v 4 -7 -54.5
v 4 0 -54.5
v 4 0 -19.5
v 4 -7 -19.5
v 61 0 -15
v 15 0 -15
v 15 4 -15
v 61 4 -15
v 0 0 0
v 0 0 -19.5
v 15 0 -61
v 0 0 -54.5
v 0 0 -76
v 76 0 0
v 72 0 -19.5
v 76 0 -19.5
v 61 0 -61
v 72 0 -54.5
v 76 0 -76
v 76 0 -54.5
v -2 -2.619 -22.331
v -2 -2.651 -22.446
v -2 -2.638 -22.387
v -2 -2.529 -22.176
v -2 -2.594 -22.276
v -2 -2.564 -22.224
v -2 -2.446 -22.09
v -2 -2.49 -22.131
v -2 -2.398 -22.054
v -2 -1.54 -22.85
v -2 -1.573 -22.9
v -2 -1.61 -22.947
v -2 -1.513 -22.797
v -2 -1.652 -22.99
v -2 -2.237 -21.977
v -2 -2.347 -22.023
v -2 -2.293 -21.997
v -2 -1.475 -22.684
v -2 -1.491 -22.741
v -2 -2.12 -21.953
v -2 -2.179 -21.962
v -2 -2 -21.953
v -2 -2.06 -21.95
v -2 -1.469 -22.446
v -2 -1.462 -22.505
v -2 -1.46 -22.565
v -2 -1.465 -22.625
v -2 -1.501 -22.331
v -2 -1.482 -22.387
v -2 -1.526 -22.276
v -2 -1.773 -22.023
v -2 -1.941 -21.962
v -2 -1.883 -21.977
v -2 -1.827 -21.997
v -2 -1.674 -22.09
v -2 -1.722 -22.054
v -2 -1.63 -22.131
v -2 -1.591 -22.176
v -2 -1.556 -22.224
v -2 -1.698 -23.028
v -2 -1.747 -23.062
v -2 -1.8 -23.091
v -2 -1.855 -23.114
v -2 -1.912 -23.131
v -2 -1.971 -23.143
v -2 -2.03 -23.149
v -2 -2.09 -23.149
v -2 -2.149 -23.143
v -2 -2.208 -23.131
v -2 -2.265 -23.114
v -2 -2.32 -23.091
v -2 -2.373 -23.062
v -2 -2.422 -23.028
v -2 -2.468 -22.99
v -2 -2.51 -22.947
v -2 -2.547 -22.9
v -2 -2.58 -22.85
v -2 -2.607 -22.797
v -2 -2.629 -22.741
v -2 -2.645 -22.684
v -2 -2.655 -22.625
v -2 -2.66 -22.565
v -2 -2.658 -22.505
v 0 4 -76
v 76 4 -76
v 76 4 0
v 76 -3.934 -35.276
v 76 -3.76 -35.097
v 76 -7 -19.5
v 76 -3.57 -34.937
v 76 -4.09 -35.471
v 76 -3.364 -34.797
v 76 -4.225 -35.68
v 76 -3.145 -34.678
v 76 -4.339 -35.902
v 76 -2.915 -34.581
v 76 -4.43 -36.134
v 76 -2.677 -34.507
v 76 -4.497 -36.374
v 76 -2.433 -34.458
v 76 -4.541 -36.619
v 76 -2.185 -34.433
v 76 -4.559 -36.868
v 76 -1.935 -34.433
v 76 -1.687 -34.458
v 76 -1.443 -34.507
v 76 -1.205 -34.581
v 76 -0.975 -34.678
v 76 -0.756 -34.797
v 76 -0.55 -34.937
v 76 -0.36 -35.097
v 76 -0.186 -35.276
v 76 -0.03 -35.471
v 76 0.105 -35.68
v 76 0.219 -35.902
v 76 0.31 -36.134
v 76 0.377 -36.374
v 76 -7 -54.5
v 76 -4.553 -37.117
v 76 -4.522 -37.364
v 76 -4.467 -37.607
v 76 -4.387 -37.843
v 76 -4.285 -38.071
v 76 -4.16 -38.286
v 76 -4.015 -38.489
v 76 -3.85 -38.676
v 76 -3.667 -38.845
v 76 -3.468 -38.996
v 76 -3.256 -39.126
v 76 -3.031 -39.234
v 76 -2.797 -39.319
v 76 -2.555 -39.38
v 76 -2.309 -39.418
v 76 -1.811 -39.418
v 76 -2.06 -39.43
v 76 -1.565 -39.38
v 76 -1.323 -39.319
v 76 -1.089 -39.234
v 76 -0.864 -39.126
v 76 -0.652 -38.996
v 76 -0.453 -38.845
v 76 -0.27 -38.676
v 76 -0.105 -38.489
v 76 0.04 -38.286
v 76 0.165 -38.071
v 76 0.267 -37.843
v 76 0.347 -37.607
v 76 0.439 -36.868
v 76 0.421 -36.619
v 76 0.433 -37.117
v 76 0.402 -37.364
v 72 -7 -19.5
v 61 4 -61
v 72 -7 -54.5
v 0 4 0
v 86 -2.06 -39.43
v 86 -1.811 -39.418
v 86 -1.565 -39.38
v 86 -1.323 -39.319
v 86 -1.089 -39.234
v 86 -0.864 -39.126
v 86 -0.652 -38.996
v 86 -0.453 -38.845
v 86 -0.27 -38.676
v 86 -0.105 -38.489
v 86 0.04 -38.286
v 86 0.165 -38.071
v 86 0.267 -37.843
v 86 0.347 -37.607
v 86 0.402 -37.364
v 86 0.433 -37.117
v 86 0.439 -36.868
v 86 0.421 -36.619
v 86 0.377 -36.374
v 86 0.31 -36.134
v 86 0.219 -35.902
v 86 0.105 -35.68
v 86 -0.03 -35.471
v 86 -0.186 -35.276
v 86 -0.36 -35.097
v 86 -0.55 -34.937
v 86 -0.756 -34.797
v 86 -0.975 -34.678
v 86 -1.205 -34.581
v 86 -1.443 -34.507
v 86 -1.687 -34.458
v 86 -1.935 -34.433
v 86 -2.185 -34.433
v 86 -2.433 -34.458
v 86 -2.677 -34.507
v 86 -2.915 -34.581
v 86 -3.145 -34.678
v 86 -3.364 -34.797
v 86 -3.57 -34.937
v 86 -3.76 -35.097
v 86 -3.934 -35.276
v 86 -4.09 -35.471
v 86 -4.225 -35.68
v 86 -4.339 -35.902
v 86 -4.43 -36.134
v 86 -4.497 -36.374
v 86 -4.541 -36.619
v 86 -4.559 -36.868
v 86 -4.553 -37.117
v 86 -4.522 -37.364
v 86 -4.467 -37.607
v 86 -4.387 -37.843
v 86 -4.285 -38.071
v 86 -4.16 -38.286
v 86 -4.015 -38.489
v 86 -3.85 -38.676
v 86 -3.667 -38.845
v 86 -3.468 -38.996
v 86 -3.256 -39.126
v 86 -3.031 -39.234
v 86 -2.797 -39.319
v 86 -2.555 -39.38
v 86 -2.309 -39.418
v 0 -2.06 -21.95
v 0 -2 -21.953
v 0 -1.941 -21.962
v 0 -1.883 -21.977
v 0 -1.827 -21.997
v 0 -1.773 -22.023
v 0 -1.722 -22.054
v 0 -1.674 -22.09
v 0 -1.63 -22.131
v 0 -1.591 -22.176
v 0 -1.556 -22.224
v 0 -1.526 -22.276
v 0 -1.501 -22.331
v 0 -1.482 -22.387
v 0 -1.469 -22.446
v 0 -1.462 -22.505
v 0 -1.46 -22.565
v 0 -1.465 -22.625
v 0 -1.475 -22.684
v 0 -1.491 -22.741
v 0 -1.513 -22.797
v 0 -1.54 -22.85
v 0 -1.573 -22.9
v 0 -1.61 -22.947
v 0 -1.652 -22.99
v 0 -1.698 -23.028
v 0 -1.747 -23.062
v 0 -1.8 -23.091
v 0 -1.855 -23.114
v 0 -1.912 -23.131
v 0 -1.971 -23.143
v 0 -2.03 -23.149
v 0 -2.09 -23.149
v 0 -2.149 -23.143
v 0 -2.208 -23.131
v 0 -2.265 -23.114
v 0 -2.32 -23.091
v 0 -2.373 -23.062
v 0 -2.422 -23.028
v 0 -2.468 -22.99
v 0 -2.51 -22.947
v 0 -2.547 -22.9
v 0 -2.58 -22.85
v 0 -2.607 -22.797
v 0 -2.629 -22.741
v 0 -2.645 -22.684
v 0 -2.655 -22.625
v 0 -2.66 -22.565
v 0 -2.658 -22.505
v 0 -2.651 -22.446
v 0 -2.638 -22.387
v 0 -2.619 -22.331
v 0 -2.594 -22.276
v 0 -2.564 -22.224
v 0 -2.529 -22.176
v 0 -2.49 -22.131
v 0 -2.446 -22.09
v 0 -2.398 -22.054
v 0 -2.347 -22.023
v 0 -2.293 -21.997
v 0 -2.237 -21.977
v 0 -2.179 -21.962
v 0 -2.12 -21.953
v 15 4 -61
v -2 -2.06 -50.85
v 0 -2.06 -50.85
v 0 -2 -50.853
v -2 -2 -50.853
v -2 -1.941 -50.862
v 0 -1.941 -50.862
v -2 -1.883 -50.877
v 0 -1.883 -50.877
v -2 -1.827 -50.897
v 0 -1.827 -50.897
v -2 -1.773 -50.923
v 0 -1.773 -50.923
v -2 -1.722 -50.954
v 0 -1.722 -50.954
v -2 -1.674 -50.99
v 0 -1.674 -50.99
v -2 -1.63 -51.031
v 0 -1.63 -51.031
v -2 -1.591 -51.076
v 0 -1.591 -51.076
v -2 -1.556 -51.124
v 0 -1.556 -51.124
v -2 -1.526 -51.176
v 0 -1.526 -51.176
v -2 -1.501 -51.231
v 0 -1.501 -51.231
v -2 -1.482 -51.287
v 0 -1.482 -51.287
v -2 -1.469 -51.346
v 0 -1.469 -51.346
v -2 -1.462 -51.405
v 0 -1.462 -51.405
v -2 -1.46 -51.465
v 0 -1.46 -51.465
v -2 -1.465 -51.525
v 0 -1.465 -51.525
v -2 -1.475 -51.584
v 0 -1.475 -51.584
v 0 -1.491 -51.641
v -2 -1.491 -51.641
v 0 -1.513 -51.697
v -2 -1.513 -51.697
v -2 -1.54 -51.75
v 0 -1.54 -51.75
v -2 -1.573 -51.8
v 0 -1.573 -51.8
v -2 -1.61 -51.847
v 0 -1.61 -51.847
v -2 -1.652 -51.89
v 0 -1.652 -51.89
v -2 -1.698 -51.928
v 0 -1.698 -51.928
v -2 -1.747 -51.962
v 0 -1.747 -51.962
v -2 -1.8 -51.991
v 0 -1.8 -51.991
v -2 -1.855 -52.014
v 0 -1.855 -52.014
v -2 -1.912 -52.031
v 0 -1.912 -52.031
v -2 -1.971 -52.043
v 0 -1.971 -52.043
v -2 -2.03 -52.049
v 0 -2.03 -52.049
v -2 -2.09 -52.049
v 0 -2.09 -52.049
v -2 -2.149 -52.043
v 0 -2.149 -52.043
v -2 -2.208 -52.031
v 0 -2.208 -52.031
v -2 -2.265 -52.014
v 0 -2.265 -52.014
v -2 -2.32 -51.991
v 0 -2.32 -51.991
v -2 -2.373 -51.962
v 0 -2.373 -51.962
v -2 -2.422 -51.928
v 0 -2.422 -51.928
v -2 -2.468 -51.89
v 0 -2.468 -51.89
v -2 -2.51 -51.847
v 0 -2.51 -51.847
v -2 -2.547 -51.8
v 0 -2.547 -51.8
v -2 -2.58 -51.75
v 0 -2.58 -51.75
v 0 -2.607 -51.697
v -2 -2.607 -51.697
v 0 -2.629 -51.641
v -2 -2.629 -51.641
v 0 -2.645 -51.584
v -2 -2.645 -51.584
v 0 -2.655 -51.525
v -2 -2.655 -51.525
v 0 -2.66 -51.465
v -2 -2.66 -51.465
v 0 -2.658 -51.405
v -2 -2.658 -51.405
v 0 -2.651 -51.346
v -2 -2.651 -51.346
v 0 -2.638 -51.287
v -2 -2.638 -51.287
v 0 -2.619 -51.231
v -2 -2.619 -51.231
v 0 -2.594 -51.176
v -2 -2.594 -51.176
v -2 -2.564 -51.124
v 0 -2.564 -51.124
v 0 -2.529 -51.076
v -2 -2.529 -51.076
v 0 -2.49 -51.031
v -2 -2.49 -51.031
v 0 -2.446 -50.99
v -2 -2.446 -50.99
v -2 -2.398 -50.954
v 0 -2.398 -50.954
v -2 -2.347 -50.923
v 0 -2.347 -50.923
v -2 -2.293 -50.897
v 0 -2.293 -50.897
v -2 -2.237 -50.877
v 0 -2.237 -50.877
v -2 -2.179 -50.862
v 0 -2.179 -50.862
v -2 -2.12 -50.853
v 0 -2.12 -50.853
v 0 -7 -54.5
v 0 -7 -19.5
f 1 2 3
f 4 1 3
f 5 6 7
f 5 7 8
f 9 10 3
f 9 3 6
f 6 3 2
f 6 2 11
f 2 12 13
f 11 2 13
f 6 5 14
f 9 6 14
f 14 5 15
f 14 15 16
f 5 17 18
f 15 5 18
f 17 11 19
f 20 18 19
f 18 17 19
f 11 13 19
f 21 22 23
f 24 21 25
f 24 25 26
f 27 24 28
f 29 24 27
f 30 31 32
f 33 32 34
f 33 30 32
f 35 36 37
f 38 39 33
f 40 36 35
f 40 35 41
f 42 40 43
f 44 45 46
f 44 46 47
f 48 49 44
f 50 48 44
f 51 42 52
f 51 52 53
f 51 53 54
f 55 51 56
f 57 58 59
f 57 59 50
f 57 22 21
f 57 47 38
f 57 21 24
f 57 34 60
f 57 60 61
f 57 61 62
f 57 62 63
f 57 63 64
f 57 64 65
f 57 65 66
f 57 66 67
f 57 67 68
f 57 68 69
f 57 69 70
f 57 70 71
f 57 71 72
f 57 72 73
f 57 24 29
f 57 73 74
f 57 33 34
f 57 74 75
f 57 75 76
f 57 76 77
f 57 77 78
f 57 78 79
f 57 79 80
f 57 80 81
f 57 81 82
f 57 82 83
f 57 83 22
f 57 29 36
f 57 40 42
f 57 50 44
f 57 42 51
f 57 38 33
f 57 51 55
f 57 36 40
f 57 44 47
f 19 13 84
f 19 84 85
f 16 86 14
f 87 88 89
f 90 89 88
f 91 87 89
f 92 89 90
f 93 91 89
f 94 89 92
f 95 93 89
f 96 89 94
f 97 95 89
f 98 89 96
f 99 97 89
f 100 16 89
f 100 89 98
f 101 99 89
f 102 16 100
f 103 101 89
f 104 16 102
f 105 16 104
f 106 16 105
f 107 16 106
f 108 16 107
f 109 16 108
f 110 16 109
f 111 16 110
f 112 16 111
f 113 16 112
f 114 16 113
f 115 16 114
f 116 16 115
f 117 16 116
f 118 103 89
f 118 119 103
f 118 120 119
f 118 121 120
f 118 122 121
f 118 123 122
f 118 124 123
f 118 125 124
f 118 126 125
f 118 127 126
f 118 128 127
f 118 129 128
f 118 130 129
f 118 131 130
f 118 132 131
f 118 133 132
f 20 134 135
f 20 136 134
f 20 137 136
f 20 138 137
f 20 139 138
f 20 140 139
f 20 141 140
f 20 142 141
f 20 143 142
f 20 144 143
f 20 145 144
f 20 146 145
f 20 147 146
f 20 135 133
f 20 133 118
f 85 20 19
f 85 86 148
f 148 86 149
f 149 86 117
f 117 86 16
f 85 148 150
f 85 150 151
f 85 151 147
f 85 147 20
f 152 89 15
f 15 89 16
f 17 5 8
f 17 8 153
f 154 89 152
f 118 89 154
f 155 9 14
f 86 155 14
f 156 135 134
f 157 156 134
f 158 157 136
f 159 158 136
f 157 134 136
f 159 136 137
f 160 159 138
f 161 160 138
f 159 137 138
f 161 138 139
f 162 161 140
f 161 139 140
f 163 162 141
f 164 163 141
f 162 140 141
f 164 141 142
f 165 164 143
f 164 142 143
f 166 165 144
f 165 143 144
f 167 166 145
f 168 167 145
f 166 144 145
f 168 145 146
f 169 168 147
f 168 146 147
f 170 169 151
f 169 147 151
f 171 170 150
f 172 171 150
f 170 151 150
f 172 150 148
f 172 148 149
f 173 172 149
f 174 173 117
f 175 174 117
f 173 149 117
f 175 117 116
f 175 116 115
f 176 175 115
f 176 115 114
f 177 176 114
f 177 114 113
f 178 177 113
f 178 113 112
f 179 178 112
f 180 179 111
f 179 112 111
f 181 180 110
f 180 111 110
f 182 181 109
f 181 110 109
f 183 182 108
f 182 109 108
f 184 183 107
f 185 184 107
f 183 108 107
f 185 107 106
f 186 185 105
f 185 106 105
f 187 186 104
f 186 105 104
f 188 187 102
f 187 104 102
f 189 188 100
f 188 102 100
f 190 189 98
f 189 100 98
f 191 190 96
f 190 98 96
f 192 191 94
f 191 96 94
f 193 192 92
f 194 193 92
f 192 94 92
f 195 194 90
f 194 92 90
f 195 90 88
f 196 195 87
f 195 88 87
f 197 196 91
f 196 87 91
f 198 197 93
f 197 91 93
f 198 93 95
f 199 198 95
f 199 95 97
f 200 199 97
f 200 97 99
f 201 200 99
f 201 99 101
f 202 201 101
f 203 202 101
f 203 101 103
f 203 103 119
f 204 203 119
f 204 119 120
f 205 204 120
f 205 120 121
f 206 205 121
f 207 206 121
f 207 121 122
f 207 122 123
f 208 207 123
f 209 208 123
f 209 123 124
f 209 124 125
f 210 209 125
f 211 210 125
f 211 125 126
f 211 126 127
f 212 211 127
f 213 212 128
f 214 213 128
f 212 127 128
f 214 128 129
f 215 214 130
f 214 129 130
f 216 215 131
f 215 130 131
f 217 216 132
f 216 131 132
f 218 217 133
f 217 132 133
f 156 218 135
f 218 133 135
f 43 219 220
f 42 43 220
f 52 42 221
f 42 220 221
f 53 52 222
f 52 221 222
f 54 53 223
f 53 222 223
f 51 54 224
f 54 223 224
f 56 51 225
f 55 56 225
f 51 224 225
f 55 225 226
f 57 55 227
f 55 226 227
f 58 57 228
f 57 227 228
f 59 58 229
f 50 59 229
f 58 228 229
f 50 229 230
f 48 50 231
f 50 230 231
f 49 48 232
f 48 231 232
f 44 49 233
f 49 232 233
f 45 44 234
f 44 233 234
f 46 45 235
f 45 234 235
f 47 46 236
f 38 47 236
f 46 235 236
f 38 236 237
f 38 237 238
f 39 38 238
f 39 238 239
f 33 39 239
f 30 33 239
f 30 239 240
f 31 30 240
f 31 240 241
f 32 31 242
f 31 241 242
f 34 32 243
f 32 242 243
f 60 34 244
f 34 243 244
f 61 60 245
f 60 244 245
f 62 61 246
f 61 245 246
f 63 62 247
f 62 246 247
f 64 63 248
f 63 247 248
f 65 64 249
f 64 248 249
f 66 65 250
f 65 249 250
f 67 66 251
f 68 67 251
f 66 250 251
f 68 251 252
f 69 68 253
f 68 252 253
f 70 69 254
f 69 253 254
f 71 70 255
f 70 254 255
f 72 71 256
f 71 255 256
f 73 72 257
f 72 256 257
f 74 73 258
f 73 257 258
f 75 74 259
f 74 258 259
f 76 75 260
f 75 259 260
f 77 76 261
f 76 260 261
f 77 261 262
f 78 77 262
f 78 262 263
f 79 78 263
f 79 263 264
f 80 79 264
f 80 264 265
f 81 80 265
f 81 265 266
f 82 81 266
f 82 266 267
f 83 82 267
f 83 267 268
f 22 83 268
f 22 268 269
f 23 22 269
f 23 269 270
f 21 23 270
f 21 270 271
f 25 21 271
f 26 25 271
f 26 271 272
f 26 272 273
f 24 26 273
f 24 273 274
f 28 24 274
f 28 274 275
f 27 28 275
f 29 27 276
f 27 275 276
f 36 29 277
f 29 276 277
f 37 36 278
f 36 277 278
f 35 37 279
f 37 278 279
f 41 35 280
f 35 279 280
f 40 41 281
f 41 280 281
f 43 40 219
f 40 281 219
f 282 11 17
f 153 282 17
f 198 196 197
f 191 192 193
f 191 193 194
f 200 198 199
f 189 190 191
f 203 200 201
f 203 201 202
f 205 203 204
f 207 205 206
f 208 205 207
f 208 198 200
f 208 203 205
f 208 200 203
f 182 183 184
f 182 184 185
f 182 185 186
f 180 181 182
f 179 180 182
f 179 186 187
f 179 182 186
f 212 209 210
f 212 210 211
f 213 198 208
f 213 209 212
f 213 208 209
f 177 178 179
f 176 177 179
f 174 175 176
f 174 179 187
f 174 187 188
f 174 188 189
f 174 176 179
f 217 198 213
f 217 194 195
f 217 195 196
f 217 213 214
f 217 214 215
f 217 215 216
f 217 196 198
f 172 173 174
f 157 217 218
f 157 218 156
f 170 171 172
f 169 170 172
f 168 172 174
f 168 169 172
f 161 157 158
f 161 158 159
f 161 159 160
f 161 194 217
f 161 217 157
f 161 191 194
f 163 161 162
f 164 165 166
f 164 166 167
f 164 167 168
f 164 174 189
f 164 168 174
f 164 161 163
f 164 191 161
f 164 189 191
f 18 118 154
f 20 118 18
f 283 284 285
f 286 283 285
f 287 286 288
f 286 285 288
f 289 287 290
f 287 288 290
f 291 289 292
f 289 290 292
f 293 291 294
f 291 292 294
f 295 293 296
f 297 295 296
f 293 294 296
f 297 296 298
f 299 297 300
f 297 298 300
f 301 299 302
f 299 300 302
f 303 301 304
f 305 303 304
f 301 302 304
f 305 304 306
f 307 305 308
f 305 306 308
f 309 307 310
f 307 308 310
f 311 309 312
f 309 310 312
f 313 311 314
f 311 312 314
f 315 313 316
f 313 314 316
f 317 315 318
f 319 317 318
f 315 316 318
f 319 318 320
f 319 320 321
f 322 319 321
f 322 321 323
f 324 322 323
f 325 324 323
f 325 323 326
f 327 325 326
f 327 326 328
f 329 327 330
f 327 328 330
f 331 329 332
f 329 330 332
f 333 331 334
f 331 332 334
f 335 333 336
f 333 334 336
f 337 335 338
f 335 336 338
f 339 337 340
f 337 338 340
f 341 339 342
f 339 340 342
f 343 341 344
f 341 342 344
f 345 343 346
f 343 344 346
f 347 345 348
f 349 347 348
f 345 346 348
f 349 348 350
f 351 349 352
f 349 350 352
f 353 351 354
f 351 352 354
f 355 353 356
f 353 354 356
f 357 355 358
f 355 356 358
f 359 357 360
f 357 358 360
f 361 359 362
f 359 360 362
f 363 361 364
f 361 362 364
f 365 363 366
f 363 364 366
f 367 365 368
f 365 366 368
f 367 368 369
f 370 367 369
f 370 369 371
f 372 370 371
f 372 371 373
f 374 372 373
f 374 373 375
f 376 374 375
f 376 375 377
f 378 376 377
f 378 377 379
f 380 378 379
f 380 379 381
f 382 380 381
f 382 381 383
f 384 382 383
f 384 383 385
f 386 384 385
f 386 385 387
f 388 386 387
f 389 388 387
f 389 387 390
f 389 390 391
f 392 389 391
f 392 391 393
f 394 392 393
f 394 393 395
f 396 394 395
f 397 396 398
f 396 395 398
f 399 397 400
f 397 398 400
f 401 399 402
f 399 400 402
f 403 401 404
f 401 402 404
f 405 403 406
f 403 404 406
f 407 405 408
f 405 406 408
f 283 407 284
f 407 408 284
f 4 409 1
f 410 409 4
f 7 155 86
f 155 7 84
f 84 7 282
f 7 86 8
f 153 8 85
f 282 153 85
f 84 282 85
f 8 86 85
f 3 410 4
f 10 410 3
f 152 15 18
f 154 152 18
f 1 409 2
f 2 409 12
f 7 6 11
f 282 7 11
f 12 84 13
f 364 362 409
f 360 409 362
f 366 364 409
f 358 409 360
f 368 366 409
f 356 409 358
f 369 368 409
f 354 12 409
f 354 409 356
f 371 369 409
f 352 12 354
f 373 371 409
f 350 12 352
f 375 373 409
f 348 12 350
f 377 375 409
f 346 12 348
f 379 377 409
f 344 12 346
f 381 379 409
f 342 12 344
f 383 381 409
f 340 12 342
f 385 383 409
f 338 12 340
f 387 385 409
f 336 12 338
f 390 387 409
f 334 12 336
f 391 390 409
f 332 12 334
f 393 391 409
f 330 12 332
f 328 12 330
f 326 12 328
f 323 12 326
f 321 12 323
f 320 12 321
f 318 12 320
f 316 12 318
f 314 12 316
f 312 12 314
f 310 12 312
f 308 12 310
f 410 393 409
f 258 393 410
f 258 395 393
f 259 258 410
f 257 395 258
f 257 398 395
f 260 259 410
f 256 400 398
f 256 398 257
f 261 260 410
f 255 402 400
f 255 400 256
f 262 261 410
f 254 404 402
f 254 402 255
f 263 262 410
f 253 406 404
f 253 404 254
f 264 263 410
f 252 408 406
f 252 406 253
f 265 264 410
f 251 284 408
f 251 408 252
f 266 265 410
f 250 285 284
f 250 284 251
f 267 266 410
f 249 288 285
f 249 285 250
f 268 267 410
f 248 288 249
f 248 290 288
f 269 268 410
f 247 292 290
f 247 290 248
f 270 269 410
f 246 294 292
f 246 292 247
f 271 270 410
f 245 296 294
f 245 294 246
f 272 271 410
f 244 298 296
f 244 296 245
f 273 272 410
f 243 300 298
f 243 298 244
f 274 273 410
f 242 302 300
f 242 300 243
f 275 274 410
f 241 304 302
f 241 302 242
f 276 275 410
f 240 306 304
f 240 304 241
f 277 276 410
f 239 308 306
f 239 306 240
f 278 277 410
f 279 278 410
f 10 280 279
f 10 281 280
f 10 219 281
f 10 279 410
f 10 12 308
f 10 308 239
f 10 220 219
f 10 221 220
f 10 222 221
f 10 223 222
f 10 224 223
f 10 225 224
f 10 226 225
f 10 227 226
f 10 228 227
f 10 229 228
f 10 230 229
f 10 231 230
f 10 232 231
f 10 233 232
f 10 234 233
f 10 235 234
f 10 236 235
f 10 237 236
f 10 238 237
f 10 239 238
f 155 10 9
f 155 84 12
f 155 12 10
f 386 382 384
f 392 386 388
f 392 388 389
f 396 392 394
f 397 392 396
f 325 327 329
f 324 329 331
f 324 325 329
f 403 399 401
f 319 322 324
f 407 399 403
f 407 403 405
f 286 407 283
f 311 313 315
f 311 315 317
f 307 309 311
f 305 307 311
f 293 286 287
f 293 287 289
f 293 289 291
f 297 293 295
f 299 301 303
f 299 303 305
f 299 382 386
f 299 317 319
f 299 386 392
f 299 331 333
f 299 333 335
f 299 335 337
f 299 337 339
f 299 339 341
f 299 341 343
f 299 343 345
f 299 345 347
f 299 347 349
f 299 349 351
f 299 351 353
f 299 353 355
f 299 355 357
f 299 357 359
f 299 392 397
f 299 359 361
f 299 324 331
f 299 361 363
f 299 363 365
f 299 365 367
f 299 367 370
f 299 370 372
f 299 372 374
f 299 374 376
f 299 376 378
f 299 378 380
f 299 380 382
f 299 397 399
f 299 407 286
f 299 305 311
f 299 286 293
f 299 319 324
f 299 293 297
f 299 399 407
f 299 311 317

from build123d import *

# Parameters (mm, degrees)
SKETCH1_W             = 76
SKETCH1_H             = 76
SKETCH1_W_2           = 46
SKETCH1_H_2           = 46
BOSS_EXTRUDE2_DEPTH   = 4
SKETCH7_R             = 0.6
BOSS_EXTRUDE5_DEPTH   = 2
BOSS_EXTRUDE5_2_DEPTH = 2
SKETCH8_W             = 35
SKETCH8_H             = 11
BOSS_EXTRUDE6_DEPTH   = 4
SKETCH9_W             = 35
SKETCH9_H             = 11
BOSS_EXTRUDE7_DEPTH   = 4
SKETCH10_R            = 2.5
BOSS_EXTRUDE8_DEPTH   = 10


with BuildPart() as part:
    # Sketch1 → Boss-Extrude2 (new body)
    with BuildSketch(Plane(origin=(0, 0, 0), x_dir=(1, 0, 0), z_dir=(0, 1, 0))):
        with Locations((38, 38)):
            Rectangle(SKETCH1_W, SKETCH1_H)
        with Locations((38, 38)):
            Rectangle(SKETCH1_W_2, SKETCH1_H_2, mode=Mode.SUBTRACT)
    extrude(amount=BOSS_EXTRUDE2_DEPTH)



with BuildPart() as body_2:
    # Sketch7 → Boss-Extrude5 (new body)
    with BuildSketch(Plane.ZY):
        with Locations((-51.45, -2.06)):
            Circle(SKETCH7_R)
    extrude(amount=BOSS_EXTRUDE5_DEPTH)


with BuildPart() as body_3:
    # Sketch7 → Boss-Extrude5 2 (new body)
    with BuildSketch(Plane.ZY):
        with Locations((-22.55, -2.06)):
            Circle(SKETCH7_R)
    extrude(amount=BOSS_EXTRUDE5_2_DEPTH)


with BuildPart() as part_1:
    add(part.part)

    add(body_2.part)  # Boss-Extrude6 merges body 2

    add(body_3.part)  # Boss-Extrude6 merges body 3
    # Sketch8 → Boss-Extrude6 (add)
    with BuildSketch(Plane.ZY):
        with Locations((-37, -1.5)):
            Rectangle(SKETCH8_W, SKETCH8_H)
    extrude(amount=-BOSS_EXTRUDE6_DEPTH)

    # Sketch9 → Boss-Extrude7 (add)
    with BuildSketch(Plane(origin=(76, 0, 0), x_dir=(0, 0, -1), z_dir=(1, 0, 0))):
        with Locations((37, -1.5)):
            Rectangle(SKETCH9_W, SKETCH9_H)
    extrude(amount=-BOSS_EXTRUDE7_DEPTH)

    # Sketch10 → Boss-Extrude8 (add)
    with BuildSketch(Plane(origin=(76, 0, 0), x_dir=(0, 0, -1), z_dir=(1, 0, 0))):
        with Locations((36.93, -2.06)):
            Circle(SKETCH10_R)
    extrude(amount=BOSS_EXTRUDE8_DEPTH)


solid = part_1.part
